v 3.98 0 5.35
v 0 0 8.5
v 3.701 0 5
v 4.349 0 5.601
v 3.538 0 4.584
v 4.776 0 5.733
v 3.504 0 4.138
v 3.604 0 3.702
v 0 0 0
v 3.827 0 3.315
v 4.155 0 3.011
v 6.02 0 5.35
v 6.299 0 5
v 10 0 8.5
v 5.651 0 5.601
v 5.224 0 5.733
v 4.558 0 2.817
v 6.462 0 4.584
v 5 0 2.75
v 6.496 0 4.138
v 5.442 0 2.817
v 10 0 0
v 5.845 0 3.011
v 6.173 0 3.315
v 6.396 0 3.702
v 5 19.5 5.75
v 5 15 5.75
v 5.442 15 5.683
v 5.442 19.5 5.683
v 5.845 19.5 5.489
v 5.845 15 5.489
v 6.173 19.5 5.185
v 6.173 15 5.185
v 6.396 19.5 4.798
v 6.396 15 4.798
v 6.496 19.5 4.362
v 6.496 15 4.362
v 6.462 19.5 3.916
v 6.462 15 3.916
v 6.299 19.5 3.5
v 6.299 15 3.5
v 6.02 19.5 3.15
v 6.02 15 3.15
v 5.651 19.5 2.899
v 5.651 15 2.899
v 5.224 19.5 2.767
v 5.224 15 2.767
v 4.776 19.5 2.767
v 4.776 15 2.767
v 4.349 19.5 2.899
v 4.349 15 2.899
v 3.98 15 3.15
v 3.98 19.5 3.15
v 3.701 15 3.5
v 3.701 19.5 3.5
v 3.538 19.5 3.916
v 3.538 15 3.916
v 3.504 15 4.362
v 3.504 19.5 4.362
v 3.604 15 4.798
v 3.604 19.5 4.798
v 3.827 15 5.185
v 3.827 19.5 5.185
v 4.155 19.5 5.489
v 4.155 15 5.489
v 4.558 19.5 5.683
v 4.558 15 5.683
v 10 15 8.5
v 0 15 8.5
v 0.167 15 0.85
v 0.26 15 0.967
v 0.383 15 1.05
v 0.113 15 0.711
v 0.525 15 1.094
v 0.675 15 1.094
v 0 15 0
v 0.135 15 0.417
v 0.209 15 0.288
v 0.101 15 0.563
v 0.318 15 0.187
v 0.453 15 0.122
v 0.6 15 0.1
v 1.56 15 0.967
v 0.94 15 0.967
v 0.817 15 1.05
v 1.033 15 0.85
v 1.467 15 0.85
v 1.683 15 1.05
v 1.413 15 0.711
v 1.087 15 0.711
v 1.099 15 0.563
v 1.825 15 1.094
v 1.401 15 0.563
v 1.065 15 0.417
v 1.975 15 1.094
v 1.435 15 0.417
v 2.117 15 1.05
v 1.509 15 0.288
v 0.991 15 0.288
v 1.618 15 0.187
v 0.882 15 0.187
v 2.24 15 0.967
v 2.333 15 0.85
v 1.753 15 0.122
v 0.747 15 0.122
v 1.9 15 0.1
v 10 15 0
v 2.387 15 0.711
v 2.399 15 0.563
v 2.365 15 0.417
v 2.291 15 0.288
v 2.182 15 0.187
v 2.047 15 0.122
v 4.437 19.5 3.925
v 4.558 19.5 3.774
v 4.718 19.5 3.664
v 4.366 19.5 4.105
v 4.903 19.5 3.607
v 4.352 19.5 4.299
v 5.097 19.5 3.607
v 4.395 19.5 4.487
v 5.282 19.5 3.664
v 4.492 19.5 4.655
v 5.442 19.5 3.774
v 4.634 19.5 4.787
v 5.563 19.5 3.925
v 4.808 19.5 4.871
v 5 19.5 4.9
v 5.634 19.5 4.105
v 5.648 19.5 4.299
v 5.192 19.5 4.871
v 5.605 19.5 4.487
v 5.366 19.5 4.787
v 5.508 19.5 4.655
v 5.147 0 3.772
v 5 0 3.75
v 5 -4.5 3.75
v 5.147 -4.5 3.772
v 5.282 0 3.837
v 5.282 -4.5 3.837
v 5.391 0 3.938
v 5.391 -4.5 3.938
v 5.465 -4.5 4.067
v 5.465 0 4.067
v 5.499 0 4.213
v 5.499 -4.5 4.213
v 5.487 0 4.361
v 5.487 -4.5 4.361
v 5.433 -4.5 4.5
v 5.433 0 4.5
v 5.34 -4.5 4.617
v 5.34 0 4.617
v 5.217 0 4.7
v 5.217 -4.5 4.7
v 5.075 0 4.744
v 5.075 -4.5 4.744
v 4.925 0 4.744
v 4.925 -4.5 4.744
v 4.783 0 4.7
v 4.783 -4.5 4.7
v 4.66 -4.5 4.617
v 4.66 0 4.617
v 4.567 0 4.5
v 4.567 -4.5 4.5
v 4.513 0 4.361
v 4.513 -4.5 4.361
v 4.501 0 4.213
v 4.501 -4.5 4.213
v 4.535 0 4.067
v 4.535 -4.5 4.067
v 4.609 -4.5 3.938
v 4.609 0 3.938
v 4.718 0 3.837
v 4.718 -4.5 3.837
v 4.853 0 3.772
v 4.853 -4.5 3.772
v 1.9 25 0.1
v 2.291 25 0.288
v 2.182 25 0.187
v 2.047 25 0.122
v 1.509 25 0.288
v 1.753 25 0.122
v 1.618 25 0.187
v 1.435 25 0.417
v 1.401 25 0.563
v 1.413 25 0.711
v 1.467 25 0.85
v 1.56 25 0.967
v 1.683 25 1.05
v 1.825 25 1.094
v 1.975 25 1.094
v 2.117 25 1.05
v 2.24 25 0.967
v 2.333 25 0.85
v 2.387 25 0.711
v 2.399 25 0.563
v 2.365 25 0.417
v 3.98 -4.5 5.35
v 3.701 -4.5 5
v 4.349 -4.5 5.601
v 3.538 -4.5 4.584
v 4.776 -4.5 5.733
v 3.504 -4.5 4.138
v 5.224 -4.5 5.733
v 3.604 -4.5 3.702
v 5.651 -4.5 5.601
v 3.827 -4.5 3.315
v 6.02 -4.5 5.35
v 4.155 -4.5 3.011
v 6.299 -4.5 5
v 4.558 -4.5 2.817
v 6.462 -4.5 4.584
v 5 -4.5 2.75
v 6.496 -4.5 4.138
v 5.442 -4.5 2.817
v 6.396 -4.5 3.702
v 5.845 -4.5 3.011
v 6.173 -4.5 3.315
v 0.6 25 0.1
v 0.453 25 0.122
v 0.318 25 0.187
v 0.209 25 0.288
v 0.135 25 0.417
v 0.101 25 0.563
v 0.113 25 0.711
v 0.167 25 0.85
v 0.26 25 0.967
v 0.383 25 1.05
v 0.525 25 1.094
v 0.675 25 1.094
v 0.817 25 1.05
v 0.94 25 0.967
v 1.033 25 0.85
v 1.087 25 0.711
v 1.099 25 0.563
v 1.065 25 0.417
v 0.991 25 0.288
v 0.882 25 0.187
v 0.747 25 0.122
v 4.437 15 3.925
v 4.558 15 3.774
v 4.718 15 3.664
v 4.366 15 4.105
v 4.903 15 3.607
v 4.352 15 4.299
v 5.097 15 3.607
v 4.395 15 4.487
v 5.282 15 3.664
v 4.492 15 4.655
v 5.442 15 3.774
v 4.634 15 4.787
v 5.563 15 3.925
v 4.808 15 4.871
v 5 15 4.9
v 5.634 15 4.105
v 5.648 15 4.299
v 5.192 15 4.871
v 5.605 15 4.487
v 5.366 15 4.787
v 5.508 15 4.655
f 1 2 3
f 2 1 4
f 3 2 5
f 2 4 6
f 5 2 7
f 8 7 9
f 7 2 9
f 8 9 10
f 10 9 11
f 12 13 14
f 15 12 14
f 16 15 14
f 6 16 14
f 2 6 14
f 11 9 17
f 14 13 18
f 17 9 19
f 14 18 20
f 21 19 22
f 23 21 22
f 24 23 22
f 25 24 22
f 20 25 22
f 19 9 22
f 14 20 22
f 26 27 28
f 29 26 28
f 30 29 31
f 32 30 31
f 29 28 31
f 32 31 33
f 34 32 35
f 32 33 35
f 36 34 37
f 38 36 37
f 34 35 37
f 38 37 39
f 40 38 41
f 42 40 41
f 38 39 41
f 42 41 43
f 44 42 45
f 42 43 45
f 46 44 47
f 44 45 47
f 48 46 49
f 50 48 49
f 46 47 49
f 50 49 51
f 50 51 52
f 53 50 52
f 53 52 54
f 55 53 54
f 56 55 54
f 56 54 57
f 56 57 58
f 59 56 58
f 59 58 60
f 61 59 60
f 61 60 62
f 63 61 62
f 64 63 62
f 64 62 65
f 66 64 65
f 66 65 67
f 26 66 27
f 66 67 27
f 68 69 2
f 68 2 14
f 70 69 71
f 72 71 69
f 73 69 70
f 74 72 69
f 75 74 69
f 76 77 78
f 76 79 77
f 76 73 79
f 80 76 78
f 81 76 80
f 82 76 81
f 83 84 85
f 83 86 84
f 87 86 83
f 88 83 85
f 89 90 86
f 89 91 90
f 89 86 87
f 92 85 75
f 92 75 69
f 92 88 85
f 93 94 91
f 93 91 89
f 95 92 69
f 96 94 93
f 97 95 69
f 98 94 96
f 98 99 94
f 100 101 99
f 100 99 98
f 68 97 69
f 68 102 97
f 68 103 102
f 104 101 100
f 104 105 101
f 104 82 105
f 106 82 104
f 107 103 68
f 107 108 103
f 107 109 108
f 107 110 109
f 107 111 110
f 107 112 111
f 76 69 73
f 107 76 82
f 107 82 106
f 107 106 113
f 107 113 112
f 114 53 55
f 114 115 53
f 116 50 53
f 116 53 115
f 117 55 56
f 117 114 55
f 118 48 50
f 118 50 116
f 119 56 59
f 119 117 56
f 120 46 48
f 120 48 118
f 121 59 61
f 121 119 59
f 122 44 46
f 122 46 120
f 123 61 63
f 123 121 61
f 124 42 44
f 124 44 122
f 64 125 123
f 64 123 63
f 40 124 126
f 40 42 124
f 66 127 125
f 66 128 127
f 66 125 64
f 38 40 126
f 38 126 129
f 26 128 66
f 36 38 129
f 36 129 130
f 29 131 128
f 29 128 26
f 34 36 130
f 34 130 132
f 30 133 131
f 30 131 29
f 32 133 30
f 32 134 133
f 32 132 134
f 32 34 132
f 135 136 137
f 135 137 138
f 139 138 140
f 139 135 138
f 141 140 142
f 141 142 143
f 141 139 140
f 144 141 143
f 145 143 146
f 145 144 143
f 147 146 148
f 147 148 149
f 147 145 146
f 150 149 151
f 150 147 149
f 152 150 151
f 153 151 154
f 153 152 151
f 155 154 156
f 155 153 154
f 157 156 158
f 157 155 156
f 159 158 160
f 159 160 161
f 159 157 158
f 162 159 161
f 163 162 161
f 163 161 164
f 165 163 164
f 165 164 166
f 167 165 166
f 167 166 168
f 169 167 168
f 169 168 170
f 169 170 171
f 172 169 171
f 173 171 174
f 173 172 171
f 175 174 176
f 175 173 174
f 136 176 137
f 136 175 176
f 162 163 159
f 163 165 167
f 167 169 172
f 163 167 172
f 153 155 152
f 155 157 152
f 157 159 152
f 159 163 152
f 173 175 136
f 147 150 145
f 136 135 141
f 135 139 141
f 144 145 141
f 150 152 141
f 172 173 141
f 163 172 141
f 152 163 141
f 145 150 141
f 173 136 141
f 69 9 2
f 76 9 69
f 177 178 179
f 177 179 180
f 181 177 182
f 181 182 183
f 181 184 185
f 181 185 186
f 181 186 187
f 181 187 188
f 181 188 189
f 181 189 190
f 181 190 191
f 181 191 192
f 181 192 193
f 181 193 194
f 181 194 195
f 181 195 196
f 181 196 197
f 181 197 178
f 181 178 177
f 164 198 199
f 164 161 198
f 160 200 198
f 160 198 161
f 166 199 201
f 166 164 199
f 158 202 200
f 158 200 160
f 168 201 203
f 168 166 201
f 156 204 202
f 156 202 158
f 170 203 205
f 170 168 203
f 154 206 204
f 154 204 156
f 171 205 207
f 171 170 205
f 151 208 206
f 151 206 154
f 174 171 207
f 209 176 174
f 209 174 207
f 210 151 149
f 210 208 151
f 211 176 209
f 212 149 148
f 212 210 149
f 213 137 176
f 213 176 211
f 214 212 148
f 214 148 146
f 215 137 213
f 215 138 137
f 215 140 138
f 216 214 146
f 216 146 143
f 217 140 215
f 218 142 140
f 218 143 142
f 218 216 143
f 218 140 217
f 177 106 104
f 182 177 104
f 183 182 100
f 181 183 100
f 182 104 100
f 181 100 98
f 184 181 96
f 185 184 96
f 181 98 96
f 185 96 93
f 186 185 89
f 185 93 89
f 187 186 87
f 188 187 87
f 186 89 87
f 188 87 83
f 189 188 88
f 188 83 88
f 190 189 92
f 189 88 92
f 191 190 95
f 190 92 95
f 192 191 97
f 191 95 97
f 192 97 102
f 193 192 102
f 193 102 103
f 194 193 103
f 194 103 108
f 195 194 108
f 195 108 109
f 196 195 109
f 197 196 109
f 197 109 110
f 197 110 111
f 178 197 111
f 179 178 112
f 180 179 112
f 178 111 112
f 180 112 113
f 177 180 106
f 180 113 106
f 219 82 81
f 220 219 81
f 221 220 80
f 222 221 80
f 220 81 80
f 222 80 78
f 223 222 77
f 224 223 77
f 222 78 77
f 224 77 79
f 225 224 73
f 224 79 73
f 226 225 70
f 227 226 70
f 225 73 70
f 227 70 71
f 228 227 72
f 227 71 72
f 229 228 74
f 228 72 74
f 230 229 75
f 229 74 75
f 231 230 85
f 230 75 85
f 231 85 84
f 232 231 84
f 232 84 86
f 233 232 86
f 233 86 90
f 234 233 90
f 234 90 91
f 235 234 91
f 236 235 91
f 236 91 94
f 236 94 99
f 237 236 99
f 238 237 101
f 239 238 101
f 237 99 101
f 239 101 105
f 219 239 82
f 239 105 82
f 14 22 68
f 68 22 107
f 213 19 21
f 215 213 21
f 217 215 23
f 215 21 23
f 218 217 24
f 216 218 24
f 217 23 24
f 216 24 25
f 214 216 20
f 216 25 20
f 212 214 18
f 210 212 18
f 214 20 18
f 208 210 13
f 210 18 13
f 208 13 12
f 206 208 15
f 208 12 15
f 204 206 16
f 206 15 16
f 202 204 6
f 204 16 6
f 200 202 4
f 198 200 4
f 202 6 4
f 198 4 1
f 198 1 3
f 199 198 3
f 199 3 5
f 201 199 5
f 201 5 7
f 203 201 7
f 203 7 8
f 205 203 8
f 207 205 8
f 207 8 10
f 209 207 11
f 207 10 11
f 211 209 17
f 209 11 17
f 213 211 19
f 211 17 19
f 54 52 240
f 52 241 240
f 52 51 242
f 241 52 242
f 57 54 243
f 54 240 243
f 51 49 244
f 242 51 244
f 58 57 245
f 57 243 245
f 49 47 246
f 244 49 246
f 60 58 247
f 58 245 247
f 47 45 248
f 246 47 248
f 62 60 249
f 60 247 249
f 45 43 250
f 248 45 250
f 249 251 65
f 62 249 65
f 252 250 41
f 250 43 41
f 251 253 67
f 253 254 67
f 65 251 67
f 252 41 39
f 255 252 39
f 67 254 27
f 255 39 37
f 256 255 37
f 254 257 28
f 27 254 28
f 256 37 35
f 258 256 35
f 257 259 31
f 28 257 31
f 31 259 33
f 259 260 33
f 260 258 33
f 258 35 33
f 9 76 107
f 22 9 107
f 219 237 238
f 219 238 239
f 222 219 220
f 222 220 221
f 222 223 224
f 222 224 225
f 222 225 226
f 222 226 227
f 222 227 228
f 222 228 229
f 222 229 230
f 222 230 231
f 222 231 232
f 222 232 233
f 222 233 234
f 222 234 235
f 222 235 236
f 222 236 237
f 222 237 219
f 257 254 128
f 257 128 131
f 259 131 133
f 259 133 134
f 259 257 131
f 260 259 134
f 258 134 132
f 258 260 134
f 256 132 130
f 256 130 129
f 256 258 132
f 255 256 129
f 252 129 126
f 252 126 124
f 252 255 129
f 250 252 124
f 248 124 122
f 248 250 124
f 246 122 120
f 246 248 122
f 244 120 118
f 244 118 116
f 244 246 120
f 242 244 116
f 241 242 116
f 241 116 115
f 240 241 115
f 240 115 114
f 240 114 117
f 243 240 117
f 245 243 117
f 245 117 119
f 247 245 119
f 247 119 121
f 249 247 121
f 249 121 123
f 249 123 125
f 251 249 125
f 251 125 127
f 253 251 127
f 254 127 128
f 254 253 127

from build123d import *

# Parameters (mm, degrees)
ESQUISSE1_W        = 10
ESQUISSE1_H        = 15
BOSS_EXTRU_1_DEPTH = 8.5
ESQUISSE2_R        = 1.5
ESQUISSE2_R_2      = 0.5
BOSS_EXTRU_2_DEPTH = 4.5
ESQUISSE3_R        = 1.5
ESQUISSE3_R_2      = 0.65
BOSS_EXTRU_3_DEPTH = 4.5
ESQUISSE4_R        = 0.5
BOSS_EXTRU_4_DEPTH = 10


with BuildPart() as part:
    # Esquisse1 → Boss.-Extru.1 (new body)
    with BuildSketch(Plane.XY):
        with Locations((5, 7.5)):
            Rectangle(ESQUISSE1_W, ESQUISSE1_H)
    extrude(amount=BOSS_EXTRU_1_DEPTH)

    # Esquisse2 → Boss.-Extru.2 (add)
    with BuildSketch(Plane.XZ):
        with Locations(Location((5, 4.25, 0), (0, 0, 270))):
            Circle(ESQUISSE2_R)
        with Locations(Location((5, 4.25, 0), (0, 0, 270))):
            Circle(ESQUISSE2_R_2, mode=Mode.SUBTRACT)
    extrude(amount=BOSS_EXTRU_2_DEPTH)

    # Esquisse4 → Boss.-Extru.4 (add)
    with BuildSketch(Plane(origin=(0, 15, 0), x_dir=(1, 0, 0), z_dir=(0, 1, 0))):
        with Locations(Location((0.6, -0.6, 0), (0, 0, 90))):
            Circle(ESQUISSE4_R)
        with Locations(Location((1.9, -0.6, 0), (0, 0, 90))):
            Circle(ESQUISSE4_R)
    extrude(amount=BOSS_EXTRU_4_DEPTH)


with BuildPart() as body_2:
    # Esquisse3 → Boss.-Extru.3 (new body)
    with BuildSketch(Plane(origin=(0, 15, 0), x_dir=(1, 0, 0), z_dir=(0, 1, 0))):
        with Locations(Location((5, -4.25, 0), (0, 0, 270))):
            Circle(ESQUISSE3_R)
        with Locations(Location((5, -4.25, 0), (0, 0, 270))):
            Circle(ESQUISSE3_R_2, mode=Mode.SUBTRACT)
    extrude(amount=BOSS_EXTRU_3_DEPTH)


solid = Compound([part.part, body_2.part])
